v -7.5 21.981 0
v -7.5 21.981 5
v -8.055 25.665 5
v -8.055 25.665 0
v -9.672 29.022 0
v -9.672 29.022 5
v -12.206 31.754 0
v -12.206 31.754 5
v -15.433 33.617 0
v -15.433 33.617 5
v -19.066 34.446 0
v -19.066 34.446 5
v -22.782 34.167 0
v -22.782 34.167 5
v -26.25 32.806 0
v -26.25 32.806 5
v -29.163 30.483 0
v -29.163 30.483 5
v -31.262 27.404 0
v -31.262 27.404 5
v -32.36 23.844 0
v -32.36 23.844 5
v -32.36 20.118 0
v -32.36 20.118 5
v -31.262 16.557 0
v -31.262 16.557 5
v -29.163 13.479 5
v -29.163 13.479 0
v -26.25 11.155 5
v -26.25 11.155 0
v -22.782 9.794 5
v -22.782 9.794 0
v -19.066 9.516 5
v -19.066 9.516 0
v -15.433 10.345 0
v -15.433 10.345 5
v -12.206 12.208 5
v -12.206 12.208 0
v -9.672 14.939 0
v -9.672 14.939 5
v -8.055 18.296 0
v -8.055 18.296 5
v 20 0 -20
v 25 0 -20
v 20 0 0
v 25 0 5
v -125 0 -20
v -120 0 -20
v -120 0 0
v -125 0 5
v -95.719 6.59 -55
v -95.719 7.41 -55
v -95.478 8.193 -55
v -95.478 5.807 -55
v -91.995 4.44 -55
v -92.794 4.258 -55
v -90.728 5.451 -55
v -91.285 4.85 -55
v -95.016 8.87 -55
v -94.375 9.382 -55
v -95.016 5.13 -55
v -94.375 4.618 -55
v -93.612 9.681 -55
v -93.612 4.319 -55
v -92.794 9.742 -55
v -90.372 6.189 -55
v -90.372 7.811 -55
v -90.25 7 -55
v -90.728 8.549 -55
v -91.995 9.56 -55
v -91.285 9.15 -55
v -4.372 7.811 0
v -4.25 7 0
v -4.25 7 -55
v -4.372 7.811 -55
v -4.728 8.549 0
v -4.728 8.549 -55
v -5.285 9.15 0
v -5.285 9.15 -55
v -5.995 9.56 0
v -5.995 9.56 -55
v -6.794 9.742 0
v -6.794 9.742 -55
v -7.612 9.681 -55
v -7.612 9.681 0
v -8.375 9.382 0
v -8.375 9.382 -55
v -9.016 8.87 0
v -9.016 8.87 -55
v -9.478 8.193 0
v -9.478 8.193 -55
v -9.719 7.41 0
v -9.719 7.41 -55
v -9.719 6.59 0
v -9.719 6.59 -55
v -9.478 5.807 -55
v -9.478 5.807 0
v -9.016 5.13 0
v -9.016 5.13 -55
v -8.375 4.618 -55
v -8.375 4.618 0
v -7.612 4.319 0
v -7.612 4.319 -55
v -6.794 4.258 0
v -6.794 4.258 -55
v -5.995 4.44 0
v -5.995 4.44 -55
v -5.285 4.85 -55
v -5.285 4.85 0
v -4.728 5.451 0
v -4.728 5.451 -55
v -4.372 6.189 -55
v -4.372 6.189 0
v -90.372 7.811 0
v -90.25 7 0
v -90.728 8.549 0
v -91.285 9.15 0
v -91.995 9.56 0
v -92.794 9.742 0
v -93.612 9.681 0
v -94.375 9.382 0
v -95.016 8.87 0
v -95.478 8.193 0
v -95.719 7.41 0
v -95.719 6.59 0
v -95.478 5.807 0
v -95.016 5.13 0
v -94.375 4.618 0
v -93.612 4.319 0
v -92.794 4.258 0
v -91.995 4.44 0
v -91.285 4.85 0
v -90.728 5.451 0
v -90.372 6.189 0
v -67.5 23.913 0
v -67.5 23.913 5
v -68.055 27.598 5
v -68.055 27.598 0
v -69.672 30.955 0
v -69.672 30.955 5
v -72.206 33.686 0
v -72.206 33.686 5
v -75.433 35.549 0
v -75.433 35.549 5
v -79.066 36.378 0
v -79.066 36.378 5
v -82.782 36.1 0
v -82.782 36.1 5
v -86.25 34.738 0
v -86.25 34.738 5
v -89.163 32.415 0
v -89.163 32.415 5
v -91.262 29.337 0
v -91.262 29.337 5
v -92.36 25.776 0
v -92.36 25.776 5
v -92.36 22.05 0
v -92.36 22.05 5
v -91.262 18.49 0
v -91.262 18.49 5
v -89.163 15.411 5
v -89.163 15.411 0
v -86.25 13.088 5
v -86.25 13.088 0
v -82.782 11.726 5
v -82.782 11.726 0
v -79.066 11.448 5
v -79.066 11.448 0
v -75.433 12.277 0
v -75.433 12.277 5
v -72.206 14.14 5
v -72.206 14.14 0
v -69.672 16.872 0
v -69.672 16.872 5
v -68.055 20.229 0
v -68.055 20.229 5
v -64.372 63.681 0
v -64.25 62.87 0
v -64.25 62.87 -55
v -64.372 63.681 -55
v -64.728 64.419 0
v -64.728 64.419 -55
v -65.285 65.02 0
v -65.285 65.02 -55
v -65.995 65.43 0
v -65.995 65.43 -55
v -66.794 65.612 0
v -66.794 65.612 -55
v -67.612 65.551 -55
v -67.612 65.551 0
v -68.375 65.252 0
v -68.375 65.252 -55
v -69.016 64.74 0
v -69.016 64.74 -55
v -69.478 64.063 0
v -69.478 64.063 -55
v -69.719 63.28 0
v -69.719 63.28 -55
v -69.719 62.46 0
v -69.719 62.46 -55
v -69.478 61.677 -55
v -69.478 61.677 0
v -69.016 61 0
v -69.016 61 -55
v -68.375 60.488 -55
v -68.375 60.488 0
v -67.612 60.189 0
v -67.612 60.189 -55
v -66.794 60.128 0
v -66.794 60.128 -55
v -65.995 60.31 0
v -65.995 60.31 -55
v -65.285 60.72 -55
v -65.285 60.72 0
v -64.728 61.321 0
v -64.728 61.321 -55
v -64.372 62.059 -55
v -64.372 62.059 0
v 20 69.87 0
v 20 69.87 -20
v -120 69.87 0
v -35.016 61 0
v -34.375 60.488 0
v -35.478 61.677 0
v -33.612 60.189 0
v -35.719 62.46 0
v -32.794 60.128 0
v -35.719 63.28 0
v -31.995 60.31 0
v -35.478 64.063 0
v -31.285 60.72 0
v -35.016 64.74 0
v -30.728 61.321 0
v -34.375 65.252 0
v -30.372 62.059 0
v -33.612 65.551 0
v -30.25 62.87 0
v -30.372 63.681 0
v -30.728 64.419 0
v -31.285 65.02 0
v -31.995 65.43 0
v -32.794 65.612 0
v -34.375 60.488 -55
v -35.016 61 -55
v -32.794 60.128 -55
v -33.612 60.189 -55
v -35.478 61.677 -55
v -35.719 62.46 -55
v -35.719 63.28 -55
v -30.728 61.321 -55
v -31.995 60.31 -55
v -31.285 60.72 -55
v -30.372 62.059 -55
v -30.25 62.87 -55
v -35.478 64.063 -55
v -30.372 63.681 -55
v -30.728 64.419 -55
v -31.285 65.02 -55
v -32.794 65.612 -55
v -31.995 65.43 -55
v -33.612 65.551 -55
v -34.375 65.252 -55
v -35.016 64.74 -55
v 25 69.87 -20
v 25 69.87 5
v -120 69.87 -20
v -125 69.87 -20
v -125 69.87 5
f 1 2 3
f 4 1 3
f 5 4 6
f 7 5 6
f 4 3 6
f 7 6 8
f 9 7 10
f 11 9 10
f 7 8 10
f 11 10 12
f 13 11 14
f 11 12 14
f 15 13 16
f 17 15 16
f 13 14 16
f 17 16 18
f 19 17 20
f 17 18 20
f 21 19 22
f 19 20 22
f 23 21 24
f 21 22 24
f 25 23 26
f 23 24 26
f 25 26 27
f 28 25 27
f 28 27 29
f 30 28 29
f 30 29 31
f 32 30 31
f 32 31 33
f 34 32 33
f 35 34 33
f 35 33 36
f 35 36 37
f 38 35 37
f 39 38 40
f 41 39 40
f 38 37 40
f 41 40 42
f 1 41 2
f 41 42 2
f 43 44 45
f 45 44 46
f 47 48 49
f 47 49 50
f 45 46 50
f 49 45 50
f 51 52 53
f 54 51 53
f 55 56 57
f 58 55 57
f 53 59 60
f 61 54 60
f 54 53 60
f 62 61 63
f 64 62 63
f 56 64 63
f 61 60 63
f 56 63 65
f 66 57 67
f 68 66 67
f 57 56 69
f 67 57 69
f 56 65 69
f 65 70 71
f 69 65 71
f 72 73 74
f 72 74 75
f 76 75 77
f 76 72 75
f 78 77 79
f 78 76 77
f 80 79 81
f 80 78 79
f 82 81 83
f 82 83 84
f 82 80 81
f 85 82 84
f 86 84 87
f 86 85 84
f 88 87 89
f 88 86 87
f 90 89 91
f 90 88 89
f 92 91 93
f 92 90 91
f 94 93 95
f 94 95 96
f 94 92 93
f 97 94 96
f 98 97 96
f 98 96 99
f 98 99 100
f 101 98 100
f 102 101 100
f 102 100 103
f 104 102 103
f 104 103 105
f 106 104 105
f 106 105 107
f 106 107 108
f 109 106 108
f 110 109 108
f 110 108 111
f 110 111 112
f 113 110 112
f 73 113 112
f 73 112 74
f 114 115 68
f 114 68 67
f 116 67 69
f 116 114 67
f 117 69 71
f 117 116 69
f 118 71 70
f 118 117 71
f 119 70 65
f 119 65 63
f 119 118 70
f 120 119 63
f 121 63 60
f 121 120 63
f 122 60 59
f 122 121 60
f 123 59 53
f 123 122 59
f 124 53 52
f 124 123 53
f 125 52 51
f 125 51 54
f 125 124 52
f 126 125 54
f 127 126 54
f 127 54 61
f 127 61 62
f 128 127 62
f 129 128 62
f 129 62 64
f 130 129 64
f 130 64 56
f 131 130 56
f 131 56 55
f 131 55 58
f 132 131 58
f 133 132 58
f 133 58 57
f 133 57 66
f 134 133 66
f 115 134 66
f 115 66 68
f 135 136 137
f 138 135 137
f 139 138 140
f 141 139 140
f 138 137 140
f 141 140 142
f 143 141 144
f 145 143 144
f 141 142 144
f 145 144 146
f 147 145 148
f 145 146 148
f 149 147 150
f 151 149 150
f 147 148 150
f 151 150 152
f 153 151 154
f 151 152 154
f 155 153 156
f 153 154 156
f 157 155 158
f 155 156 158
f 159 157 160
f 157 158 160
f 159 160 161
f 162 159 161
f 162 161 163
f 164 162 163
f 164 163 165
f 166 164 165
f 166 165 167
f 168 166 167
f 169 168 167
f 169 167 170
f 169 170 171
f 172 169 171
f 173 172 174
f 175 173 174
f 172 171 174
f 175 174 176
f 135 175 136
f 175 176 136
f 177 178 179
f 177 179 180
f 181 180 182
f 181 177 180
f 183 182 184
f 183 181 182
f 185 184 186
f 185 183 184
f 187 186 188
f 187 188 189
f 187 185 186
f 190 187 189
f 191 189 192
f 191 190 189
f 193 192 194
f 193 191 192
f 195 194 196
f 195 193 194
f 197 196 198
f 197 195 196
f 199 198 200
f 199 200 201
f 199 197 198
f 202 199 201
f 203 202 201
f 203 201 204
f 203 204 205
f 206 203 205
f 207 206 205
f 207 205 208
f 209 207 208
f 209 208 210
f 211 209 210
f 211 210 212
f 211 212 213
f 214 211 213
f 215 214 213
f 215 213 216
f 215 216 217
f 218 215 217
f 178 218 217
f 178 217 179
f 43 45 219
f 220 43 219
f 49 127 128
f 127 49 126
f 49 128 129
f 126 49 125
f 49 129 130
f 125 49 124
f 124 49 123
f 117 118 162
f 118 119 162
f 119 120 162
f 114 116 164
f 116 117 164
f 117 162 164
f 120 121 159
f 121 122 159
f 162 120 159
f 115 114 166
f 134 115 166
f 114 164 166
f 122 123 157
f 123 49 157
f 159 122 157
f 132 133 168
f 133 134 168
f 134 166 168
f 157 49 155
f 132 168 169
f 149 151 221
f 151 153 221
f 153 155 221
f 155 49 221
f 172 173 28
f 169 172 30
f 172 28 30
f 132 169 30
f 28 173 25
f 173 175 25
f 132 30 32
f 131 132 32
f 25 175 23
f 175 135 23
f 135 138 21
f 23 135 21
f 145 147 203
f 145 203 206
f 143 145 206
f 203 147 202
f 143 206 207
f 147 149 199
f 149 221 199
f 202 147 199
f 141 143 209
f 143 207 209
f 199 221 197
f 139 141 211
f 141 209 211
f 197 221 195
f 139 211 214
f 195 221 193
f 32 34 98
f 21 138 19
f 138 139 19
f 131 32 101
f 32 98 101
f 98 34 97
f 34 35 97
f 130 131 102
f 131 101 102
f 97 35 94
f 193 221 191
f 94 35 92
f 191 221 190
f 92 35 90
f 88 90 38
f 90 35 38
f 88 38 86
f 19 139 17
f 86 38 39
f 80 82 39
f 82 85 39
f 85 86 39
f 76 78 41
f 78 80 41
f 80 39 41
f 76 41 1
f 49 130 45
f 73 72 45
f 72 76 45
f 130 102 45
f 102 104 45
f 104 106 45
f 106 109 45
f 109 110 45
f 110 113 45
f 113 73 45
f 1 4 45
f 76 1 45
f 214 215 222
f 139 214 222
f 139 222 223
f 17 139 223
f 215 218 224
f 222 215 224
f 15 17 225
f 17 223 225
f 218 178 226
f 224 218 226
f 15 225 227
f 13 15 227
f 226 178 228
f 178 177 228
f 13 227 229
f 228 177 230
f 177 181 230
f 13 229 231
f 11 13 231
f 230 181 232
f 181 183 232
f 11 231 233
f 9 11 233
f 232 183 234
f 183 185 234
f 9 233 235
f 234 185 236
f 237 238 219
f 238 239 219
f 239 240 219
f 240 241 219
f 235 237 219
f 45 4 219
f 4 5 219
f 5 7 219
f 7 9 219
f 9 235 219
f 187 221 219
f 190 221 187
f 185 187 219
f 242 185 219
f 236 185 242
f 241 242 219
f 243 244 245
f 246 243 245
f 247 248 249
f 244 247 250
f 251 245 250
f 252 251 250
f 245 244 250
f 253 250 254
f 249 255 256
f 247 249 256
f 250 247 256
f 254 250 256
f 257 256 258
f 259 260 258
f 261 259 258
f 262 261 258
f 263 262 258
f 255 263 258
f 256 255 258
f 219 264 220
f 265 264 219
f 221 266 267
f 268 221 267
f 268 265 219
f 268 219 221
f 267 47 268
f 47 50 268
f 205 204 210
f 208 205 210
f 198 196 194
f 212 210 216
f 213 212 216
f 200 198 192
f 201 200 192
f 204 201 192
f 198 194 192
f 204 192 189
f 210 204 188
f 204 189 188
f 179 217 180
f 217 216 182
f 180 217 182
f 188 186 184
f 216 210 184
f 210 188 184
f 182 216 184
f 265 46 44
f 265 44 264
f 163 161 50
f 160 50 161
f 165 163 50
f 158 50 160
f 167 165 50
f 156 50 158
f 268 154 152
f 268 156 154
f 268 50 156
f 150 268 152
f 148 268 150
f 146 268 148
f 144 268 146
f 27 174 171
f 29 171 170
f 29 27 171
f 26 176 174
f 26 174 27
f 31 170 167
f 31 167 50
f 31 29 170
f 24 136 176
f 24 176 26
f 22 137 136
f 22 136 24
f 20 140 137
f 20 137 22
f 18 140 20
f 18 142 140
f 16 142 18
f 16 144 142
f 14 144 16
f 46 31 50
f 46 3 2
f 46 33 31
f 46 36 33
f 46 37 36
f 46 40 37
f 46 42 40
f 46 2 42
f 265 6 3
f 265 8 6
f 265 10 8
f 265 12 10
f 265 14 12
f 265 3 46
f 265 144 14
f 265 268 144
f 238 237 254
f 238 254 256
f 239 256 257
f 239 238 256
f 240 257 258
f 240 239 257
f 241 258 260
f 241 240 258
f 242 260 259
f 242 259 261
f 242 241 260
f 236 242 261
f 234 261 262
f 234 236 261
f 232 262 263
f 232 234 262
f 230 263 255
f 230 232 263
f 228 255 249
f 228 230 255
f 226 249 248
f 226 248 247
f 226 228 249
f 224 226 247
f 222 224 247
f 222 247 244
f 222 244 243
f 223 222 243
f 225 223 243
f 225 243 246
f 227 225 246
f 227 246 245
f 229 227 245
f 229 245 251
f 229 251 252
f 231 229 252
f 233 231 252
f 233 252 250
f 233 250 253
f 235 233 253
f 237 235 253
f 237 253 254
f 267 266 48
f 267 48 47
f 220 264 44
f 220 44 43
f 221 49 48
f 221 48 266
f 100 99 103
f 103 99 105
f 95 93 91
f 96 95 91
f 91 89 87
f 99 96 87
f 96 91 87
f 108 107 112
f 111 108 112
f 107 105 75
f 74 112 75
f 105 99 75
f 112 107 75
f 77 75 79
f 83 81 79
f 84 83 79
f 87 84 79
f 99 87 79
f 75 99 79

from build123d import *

# Parameters (mm, degrees)
ESQUISSE1_W             = 100
ESQUISSE1_H             = 69.87
BOSS_EXTRU_1_DEPTH      = 5
ESQUISSE2_R             = 12.5
ENL_V_MAT_EXTRU_1_DEPTH = 5
ESQUISSE3_W             = 25
ESQUISSE3_H             = 69.87
BOSS_EXTRU_2_DEPTH      = 5
ESQUISSE4_W             = 5
ESQUISSE4_H             = 69.87
BOSS_EXTRU_3_DEPTH      = 20
ESQUISSE2_3_R           = 2.75
BOSS_EXTRU_4_DEPTH      = 60
ESQUISSE2_4_R           = 2.75
BOSS_EXTRU_5_DEPTH      = 60
ESQUISSE2_5_R           = 2.75
BOSS_EXTRU_6_DEPTH      = 60
ESQUISSE2_6_R           = 2.75
BOSS_EXTRU_7_DEPTH      = 60


with BuildPart() as part:
    # Esquisse1 → Boss.-Extru.1 (new body)
    with BuildSketch(Plane.XY):
        with Locations((-50, 34.935)):
            Rectangle(ESQUISSE1_W, ESQUISSE1_H)
    extrude(amount=BOSS_EXTRU_1_DEPTH)

    # Esquisse2 → Enlèv. mat.-Extru.1 (cut)
    with BuildSketch(Plane.XY.offset(5)):
        with Locations((-80, 23.913092396)):
            Circle(ESQUISSE2_R)
        with Locations((-20, 21.980812212)):
            Circle(ESQUISSE2_R)
    extrude(amount=-ENL_V_MAT_EXTRU_1_DEPTH, mode=Mode.SUBTRACT)

    # Esquisse3 → Boss.-Extru.2 (add)
    with BuildSketch(Plane.XY.offset(5)):
        with Locations((-112.5, 34.935)):
            Rectangle(ESQUISSE3_W, ESQUISSE3_H)
        with Locations((12.5, 34.935)):
            Rectangle(ESQUISSE3_W, ESQUISSE3_H)
    extrude(amount=-BOSS_EXTRU_2_DEPTH)

    # Esquisse4 → Boss.-Extru.3 (add)
    with BuildSketch(Plane(origin=(0, 0, 0), x_dir=(-1, 0, 0), z_dir=(0, 0, -1))):
        with Locations((122.5, 34.935)):
            Rectangle(ESQUISSE4_W, ESQUISSE4_H)
        with Locations((-22.5, 34.935)):
            Rectangle(ESQUISSE4_W, ESQUISSE4_H)
    extrude(amount=BOSS_EXTRU_3_DEPTH)

    # Esquisse2<3> → Boss.-Extru.4 (add)
    with BuildSketch(Plane.XY.offset(5)):
        with Locations((-67, 62.87)):
            Circle(ESQUISSE2_3_R)
    extrude(amount=-BOSS_EXTRU_4_DEPTH)

    # Esquisse2<4> → Boss.-Extru.5 (add)
    with BuildSketch(Plane.XY.offset(5)):
        with Locations((-33, 62.87)):
            Circle(ESQUISSE2_4_R)
    extrude(amount=-BOSS_EXTRU_5_DEPTH)

    # Esquisse2<5> → Boss.-Extru.6 (add)
    with BuildSketch(Plane.XY.offset(5)):
        with Locations((-93, 7)):
            Circle(ESQUISSE2_5_R)
    extrude(amount=-BOSS_EXTRU_6_DEPTH)

    # Esquisse2<6> → Boss.-Extru.7 (add)
    with BuildSketch(Plane.XY.offset(5)):
        with Locations((-7, 7)):
            Circle(ESQUISSE2_6_R)
    extrude(amount=-BOSS_EXTRU_7_DEPTH)


solid = part.part
